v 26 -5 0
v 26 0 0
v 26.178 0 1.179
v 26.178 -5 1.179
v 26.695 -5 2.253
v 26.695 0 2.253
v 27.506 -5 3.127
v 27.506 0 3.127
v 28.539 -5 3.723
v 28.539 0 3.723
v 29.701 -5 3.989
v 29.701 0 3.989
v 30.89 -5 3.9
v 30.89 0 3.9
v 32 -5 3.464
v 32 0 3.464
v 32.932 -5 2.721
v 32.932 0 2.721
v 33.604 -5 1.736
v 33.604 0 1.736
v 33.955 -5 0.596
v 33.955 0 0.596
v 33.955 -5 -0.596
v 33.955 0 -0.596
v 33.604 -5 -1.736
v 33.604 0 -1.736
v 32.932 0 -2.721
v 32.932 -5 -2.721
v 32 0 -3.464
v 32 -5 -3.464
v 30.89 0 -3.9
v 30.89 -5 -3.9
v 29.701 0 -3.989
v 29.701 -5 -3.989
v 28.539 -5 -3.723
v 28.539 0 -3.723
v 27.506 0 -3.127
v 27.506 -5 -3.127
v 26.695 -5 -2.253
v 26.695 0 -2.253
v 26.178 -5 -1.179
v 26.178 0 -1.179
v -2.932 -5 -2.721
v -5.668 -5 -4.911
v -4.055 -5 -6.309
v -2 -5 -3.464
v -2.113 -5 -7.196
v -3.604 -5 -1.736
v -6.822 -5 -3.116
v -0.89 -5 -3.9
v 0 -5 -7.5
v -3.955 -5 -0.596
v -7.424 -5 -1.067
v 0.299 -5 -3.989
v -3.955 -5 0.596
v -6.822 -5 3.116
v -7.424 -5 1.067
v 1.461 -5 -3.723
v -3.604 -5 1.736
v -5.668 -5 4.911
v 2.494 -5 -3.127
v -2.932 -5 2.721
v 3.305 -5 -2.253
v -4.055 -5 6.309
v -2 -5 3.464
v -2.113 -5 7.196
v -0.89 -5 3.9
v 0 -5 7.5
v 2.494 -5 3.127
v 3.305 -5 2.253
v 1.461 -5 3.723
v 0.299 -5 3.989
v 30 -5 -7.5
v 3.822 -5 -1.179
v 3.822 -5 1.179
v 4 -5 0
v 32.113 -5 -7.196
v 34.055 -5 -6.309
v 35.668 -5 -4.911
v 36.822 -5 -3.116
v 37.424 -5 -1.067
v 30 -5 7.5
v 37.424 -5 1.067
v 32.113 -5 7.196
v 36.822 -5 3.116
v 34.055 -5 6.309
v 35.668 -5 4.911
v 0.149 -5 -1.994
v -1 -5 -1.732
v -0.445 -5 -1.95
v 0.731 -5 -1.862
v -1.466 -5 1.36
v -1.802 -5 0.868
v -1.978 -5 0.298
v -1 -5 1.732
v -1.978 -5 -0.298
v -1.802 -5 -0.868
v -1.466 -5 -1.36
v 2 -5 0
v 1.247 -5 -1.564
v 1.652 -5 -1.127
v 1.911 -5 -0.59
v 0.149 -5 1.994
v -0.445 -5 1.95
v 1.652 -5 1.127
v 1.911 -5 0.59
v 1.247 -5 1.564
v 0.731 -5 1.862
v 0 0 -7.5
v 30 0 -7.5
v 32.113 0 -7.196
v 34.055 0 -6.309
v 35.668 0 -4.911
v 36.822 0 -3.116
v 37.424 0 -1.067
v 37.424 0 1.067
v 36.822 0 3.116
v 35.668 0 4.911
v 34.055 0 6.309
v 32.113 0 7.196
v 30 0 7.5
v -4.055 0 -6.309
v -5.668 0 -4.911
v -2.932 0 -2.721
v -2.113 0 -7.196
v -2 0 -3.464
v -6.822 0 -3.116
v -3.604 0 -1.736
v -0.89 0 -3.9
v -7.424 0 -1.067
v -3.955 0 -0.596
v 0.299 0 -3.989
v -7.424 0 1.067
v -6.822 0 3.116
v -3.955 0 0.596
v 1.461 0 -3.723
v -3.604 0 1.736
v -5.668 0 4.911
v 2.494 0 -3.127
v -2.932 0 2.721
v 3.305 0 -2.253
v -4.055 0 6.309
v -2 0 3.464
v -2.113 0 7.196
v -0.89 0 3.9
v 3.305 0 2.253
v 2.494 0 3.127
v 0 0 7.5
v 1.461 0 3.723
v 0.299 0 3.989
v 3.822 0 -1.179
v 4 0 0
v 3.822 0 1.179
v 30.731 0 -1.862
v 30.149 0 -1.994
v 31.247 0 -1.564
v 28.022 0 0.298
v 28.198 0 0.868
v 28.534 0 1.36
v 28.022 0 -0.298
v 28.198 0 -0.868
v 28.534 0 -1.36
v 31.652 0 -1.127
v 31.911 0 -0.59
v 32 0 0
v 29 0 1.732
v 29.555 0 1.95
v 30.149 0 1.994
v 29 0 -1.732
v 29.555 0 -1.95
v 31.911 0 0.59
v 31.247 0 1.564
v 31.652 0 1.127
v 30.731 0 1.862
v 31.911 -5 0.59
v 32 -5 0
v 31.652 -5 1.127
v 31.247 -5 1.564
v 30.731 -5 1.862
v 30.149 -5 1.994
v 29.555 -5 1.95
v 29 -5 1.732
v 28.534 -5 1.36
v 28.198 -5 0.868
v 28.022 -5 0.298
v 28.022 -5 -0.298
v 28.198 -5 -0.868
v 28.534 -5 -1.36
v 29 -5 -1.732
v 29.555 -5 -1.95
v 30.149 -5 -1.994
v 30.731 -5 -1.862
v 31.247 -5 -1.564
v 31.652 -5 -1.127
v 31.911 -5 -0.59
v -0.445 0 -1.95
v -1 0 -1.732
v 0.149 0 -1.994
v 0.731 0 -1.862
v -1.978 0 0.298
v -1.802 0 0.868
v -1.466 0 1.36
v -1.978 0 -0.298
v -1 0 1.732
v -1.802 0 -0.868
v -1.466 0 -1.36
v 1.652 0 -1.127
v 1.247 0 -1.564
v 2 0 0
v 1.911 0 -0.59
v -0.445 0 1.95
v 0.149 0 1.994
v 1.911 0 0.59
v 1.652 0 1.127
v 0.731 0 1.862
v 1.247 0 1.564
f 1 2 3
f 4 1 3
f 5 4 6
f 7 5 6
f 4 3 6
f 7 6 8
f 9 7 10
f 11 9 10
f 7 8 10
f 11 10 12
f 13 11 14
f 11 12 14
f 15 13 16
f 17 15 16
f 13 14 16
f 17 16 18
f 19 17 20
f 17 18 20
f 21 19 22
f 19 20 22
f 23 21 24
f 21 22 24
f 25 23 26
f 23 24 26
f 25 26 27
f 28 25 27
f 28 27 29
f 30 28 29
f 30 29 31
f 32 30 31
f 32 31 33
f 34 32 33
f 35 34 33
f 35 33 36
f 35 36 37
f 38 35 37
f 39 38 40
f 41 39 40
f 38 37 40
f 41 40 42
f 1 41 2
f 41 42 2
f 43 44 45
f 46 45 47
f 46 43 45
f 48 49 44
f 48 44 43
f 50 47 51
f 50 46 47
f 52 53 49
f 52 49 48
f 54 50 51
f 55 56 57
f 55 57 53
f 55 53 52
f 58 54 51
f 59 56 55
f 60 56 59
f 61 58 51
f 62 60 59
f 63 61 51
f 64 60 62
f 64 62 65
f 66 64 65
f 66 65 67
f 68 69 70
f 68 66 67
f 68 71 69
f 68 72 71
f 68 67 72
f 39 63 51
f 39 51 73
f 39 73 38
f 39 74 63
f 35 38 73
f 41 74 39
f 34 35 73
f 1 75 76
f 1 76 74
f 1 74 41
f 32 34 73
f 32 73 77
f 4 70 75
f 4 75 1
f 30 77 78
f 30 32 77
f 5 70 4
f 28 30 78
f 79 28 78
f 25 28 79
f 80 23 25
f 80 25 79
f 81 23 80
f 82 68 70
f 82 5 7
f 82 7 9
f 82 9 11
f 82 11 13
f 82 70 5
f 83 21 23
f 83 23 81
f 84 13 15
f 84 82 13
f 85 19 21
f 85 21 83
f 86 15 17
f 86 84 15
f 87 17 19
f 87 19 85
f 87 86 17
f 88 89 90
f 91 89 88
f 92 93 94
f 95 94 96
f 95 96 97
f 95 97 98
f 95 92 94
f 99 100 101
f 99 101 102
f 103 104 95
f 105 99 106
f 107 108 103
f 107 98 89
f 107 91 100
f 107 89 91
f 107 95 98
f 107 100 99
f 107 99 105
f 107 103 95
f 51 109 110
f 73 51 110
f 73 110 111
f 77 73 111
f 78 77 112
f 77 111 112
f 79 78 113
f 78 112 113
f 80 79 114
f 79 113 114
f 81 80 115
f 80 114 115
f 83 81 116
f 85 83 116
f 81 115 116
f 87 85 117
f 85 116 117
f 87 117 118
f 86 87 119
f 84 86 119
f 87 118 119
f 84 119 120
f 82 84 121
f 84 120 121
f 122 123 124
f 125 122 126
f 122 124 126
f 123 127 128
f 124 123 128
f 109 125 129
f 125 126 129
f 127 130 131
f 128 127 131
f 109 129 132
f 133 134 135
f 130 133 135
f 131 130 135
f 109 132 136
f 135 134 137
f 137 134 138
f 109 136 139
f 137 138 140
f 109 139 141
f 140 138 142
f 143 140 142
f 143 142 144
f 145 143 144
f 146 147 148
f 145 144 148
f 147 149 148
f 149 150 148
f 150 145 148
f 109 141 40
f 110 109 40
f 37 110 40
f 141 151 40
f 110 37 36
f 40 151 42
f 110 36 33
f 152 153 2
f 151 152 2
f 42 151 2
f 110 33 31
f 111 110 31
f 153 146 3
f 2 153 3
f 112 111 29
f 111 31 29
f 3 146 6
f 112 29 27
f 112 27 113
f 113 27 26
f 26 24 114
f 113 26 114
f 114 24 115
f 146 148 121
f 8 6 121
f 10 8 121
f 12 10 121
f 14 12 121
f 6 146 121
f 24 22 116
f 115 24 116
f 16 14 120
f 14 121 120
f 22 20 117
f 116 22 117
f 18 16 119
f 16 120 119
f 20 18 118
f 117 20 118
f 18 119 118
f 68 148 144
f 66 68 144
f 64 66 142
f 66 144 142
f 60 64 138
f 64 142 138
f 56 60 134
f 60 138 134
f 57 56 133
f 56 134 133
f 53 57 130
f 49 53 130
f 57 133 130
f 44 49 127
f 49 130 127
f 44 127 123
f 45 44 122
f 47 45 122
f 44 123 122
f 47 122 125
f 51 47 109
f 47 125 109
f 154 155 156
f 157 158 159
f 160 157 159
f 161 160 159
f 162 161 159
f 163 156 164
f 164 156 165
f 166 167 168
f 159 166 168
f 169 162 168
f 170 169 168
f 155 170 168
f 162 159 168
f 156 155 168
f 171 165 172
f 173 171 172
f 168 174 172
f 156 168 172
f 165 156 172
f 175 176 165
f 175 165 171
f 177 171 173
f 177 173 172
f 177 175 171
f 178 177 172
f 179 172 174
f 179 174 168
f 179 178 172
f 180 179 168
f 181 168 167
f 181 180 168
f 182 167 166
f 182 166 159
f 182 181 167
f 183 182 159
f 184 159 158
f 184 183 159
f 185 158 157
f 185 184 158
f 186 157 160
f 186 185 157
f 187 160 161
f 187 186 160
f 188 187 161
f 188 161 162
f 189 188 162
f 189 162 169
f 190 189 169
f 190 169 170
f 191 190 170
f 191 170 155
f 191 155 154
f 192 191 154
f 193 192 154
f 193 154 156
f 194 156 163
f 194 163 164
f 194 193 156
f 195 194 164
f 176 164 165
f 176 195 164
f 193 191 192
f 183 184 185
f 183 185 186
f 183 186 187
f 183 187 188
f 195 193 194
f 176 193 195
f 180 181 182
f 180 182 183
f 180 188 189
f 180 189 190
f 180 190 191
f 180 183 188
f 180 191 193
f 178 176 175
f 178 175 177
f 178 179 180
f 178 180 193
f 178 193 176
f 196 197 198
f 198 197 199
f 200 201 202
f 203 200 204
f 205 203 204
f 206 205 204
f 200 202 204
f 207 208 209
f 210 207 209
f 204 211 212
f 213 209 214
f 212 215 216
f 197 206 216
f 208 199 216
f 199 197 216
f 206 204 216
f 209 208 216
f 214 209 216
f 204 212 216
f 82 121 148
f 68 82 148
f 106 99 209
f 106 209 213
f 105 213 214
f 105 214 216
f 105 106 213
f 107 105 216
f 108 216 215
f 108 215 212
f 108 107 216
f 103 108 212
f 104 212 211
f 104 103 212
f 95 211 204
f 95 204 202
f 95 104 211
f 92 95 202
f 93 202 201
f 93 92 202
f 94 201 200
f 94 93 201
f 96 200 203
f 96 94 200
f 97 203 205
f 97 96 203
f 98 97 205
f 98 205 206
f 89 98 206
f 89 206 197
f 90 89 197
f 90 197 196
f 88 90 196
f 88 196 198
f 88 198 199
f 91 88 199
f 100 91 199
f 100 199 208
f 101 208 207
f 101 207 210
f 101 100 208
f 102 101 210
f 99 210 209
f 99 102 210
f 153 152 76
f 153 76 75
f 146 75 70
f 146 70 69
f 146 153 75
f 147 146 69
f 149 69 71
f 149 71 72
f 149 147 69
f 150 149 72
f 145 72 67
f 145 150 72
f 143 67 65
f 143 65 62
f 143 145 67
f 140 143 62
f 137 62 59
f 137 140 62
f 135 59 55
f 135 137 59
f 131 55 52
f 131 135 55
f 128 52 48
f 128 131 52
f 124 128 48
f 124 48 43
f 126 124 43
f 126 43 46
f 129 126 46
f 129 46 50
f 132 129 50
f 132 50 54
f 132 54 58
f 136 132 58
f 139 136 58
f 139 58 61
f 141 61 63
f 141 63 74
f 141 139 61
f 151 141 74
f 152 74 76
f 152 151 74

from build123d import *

# Parameters (mm, degrees)
F0_R     = 4
F1_DEPTH = 5
F2_R     = 2
F3_DEPTH = 5


with BuildPart() as f1:
    # F0 (on Front) → F1 (new body)
    with BuildSketch(Plane.XZ):
        with BuildLine():
            Line((30, 7.5), (0, 7.5))
            ThreePointArc((0, 7.5), (-7.5, 0), (0, -7.5))
            Line((0, -7.5), (30, -7.5))
            ThreePointArc((30, -7.5), (37.5, 0), (30, 7.5))
        make_face()
        Circle(F0_R, mode=Mode.SUBTRACT)
        with BuildLine():
            ThreePointArc((34, 0), (30, -4), (26, 0))
            ThreePointArc((26, 0), (30, 4), (34, 0))
        make_face(mode=Mode.SUBTRACT)
    extrude(amount=F1_DEPTH)


with BuildPart() as f3:
    # F2 (on face) → F3 (new body)
    with BuildSketch(Plane.XZ.offset(5)):
        with Locations((30, 0)):
            Circle(F2_R)
        Circle(F2_R)
    extrude(amount=-F3_DEPTH)


solid = Compound([f1.part, f3.part])
